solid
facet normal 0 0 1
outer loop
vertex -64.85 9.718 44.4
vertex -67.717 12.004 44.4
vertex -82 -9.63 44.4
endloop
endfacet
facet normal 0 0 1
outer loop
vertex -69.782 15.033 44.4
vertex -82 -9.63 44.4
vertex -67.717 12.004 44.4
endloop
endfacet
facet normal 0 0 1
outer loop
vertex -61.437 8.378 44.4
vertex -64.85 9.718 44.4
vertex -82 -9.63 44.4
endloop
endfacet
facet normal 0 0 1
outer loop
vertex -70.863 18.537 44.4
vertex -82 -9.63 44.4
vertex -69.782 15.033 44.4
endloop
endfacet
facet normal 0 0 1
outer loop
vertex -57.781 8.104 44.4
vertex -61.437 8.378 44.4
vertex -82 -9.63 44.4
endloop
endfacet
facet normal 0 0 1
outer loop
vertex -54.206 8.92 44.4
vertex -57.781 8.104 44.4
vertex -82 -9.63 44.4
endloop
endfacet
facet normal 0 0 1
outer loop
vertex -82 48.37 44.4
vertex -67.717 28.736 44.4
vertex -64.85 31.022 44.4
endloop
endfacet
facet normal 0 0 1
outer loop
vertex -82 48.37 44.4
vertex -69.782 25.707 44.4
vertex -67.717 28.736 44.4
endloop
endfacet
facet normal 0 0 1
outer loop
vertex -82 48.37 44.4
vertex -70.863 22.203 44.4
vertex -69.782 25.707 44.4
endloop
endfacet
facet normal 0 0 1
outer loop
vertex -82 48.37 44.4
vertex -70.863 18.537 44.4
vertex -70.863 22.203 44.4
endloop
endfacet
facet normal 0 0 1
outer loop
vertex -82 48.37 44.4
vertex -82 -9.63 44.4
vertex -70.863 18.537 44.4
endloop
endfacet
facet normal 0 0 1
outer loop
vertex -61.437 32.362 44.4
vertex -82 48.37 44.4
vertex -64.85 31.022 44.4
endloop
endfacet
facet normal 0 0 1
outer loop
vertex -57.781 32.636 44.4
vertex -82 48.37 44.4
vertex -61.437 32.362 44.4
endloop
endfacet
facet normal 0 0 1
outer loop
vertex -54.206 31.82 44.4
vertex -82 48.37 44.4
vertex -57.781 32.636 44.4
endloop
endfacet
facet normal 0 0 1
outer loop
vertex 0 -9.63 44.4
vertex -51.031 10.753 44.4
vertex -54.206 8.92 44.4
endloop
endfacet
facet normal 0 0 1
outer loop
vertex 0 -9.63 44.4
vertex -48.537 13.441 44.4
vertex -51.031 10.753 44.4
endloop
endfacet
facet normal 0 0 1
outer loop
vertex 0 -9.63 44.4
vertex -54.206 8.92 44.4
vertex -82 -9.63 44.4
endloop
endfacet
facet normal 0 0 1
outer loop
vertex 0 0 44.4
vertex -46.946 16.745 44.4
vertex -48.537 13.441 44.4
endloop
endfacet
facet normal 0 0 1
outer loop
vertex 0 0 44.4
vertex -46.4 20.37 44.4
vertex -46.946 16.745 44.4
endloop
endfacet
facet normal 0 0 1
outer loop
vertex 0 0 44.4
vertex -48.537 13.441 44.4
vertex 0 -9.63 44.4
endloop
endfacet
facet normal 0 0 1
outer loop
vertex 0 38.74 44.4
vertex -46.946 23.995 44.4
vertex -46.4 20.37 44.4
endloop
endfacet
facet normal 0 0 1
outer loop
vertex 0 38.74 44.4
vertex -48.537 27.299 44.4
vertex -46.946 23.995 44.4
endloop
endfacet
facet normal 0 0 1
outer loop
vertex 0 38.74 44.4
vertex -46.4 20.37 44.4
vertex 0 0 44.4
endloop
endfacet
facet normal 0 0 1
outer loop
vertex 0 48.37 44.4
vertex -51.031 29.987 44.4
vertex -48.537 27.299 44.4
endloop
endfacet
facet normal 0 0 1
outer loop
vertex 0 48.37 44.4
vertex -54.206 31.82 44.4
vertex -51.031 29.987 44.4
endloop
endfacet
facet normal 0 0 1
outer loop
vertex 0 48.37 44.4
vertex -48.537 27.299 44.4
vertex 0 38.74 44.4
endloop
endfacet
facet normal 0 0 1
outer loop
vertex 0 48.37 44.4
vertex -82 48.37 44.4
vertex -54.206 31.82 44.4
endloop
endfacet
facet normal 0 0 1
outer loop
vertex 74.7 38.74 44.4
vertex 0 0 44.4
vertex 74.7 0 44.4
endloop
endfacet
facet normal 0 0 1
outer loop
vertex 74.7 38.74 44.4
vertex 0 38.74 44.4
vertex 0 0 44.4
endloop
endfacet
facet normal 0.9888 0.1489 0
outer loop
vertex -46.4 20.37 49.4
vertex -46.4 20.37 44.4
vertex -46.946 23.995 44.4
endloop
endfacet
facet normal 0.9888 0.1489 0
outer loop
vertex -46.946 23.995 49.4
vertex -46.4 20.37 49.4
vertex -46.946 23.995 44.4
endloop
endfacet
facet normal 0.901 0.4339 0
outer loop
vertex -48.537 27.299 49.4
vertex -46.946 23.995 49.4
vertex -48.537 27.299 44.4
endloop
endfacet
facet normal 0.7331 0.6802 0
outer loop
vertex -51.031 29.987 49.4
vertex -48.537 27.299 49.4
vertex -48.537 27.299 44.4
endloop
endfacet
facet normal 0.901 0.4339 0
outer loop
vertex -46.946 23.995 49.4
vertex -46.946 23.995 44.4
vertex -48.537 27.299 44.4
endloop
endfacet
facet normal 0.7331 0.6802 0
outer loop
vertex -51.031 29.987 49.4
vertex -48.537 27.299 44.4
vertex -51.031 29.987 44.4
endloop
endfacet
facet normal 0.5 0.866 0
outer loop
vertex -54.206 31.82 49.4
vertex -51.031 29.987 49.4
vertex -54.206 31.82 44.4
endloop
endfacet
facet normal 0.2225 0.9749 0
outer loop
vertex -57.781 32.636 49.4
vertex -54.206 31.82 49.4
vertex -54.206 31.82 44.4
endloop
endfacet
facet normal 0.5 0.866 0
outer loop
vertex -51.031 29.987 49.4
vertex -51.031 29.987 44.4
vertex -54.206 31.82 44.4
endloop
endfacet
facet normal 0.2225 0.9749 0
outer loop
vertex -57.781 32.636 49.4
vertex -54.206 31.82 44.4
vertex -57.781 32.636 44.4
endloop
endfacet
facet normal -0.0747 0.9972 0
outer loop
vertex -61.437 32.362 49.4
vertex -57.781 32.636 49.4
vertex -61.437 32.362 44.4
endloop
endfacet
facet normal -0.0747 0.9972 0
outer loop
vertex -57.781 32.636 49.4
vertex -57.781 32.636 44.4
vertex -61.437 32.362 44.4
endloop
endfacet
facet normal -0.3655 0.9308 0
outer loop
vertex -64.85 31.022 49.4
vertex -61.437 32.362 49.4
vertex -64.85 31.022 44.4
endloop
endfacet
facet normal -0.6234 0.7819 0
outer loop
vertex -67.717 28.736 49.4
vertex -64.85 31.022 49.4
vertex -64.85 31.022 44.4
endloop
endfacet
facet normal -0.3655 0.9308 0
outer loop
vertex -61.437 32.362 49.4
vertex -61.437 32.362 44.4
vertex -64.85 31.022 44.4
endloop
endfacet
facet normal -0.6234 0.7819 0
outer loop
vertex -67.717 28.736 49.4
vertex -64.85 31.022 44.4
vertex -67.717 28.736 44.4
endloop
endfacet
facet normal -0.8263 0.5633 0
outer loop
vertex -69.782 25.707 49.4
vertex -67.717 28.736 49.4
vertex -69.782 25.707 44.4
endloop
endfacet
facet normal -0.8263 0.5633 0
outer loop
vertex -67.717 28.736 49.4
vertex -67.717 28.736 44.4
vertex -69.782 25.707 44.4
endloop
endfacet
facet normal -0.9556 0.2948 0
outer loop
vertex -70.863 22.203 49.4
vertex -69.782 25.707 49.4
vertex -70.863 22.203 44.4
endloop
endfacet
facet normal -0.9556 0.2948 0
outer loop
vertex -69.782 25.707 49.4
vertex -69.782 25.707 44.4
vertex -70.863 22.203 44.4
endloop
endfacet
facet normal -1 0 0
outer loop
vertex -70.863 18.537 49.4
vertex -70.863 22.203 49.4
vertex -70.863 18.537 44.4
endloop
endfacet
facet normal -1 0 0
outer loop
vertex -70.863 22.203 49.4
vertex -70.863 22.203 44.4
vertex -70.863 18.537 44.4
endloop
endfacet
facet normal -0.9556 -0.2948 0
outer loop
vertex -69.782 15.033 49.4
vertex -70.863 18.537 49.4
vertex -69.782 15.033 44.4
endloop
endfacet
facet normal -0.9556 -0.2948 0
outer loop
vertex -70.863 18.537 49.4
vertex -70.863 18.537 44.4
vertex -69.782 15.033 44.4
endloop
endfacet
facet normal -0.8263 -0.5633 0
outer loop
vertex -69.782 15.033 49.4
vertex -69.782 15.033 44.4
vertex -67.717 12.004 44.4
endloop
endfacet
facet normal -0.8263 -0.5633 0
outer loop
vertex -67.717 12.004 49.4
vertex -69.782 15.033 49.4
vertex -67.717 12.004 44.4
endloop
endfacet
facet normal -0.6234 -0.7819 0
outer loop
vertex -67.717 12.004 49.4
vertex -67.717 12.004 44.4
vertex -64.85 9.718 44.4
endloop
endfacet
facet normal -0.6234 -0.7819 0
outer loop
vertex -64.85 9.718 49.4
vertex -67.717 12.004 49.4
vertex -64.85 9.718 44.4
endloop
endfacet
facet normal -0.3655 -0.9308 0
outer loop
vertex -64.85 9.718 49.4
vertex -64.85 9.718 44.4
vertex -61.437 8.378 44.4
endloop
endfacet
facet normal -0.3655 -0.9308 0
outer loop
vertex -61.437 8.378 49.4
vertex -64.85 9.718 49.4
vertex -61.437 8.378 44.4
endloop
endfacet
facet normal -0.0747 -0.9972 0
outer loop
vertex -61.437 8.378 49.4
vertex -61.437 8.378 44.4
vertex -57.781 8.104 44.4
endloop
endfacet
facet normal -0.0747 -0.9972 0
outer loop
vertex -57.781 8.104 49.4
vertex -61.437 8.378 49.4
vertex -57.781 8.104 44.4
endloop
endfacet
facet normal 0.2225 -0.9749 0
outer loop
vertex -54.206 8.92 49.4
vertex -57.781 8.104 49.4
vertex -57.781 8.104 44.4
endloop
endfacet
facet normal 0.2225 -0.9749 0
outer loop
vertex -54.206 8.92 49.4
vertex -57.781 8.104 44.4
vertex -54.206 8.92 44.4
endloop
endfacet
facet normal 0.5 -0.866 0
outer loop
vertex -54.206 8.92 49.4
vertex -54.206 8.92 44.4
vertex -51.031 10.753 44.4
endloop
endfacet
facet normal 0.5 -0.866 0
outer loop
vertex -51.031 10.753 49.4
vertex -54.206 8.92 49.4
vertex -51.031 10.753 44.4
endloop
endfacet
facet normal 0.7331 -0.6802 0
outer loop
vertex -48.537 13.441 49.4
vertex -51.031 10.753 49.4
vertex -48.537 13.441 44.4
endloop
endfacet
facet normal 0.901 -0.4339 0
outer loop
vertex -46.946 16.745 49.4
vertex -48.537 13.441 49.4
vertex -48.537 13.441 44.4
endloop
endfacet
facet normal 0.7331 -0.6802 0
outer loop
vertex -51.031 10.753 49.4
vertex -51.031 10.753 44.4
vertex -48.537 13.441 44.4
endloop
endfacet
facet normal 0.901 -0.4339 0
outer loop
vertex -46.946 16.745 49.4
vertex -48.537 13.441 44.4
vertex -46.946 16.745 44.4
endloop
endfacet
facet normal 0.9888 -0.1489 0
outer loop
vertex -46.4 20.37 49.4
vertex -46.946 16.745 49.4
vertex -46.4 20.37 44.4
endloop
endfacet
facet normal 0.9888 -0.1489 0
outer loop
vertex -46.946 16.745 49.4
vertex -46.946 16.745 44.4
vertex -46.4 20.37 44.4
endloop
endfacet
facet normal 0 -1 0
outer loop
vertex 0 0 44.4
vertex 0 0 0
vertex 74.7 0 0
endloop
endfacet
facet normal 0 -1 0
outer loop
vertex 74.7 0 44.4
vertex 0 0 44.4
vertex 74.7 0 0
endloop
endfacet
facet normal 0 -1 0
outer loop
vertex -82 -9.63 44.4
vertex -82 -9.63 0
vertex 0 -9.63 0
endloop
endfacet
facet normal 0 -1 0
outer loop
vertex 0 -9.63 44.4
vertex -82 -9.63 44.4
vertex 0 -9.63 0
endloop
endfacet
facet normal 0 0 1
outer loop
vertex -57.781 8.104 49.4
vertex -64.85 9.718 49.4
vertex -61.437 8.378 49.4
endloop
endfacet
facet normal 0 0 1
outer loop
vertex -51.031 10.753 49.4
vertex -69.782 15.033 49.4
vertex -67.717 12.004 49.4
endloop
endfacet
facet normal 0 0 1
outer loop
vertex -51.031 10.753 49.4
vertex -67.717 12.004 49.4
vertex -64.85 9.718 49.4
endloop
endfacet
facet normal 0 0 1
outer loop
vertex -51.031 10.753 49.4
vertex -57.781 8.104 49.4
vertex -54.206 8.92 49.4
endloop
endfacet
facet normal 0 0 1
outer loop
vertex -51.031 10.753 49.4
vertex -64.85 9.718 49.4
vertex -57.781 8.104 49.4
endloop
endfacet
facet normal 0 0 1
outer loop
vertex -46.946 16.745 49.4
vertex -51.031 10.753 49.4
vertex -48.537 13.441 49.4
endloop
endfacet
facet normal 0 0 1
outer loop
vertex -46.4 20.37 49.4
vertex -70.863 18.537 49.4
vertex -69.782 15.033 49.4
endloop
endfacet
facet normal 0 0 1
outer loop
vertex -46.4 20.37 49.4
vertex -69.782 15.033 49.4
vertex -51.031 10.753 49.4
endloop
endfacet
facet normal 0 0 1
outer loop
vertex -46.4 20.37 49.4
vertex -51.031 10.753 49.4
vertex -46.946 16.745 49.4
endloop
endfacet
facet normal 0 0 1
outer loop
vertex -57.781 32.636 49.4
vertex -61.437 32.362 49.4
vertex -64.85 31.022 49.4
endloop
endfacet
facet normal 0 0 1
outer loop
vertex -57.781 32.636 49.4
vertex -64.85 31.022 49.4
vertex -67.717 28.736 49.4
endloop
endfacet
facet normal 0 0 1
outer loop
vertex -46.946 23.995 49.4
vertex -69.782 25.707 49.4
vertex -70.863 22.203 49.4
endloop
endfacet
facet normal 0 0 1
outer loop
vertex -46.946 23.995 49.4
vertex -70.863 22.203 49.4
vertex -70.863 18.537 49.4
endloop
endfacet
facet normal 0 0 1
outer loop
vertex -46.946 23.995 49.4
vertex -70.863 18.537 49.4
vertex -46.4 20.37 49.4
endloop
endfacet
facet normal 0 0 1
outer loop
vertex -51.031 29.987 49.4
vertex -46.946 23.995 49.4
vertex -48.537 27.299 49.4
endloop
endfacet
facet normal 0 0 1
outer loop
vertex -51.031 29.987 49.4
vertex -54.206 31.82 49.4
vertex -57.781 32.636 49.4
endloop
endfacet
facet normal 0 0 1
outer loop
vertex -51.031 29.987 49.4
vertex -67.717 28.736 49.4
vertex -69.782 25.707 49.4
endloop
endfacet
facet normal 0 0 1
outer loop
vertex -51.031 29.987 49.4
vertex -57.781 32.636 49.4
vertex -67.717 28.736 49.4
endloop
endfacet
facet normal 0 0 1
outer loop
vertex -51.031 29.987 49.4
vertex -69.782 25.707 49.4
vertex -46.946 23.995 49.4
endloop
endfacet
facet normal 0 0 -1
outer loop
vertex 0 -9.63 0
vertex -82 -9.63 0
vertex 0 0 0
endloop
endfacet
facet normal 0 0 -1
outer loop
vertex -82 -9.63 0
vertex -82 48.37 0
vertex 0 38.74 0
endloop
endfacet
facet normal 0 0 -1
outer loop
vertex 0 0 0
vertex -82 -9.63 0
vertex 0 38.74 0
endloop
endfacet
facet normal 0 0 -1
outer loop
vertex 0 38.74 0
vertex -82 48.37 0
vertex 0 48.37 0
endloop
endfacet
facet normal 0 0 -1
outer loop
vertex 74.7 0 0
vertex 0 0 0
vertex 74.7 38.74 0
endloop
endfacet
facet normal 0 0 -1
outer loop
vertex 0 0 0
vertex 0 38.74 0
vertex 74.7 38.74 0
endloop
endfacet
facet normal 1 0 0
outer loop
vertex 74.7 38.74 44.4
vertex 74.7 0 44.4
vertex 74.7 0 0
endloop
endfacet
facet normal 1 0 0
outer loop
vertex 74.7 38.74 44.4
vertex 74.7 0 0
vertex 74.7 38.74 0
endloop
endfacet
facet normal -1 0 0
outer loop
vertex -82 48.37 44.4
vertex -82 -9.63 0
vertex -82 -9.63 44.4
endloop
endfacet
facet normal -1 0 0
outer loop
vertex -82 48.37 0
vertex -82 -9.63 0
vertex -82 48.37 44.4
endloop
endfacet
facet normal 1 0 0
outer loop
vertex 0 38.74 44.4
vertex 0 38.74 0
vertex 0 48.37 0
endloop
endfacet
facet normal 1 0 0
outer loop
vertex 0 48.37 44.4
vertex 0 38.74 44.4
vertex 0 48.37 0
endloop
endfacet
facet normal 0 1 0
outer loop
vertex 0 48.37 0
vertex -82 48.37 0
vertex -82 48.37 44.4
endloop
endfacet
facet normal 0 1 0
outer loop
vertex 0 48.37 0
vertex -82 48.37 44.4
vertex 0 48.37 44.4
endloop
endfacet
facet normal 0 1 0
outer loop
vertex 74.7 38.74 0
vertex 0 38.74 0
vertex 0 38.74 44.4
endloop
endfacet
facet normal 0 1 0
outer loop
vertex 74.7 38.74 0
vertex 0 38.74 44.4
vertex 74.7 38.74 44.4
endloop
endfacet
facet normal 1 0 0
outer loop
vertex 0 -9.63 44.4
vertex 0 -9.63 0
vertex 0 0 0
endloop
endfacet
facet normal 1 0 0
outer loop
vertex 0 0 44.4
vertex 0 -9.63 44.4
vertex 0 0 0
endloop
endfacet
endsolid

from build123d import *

# Parameters (mm, degrees)
SKETCH_R      = 12.3
EXTRUDE_DEPTH = 5
BOX001_W      = 82
BOX001_H      = 58
BOX001_DEPTH  = 44.4
BOX_W         = 74.7
BOX_H         = 38.74
BOX_DEPTH     = 44.4


with BuildPart() as extrude_body:
    # Sketch (on Face6 of Box001) → Extrude (new body)
    with BuildSketch(Plane(origin=(-82, -9.63, 44.4), x_dir=(1, 0, 0), z_dir=(0, 0, 1))):
        with Locations((23.3, 30)):
            Circle(SKETCH_R)
    extrude(amount=EXTRUDE_DEPTH)


with BuildPart() as cube001:
    # Box001 → Box001 (new body)
    with BuildSketch(Plane(origin=(-82, -9.63, 0), x_dir=(1, 0, 0), z_dir=(0, 0, 1))):
        with Locations((41, 29)):
            Rectangle(BOX001_W, BOX001_H)
    extrude(amount=BOX001_DEPTH)


with BuildPart() as fusion002:
    # Box → Box (new body)
    with BuildSketch(Plane.XY):
        with Locations((37.35, 19.37)):
            Rectangle(BOX_W, BOX_H)
    extrude(amount=BOX_DEPTH)

    # Fusion: union Cube001
    add(cube001.part)

    # Fusion002: union Extrude body
    add(extrude_body.part)


solid = fusion002.part
